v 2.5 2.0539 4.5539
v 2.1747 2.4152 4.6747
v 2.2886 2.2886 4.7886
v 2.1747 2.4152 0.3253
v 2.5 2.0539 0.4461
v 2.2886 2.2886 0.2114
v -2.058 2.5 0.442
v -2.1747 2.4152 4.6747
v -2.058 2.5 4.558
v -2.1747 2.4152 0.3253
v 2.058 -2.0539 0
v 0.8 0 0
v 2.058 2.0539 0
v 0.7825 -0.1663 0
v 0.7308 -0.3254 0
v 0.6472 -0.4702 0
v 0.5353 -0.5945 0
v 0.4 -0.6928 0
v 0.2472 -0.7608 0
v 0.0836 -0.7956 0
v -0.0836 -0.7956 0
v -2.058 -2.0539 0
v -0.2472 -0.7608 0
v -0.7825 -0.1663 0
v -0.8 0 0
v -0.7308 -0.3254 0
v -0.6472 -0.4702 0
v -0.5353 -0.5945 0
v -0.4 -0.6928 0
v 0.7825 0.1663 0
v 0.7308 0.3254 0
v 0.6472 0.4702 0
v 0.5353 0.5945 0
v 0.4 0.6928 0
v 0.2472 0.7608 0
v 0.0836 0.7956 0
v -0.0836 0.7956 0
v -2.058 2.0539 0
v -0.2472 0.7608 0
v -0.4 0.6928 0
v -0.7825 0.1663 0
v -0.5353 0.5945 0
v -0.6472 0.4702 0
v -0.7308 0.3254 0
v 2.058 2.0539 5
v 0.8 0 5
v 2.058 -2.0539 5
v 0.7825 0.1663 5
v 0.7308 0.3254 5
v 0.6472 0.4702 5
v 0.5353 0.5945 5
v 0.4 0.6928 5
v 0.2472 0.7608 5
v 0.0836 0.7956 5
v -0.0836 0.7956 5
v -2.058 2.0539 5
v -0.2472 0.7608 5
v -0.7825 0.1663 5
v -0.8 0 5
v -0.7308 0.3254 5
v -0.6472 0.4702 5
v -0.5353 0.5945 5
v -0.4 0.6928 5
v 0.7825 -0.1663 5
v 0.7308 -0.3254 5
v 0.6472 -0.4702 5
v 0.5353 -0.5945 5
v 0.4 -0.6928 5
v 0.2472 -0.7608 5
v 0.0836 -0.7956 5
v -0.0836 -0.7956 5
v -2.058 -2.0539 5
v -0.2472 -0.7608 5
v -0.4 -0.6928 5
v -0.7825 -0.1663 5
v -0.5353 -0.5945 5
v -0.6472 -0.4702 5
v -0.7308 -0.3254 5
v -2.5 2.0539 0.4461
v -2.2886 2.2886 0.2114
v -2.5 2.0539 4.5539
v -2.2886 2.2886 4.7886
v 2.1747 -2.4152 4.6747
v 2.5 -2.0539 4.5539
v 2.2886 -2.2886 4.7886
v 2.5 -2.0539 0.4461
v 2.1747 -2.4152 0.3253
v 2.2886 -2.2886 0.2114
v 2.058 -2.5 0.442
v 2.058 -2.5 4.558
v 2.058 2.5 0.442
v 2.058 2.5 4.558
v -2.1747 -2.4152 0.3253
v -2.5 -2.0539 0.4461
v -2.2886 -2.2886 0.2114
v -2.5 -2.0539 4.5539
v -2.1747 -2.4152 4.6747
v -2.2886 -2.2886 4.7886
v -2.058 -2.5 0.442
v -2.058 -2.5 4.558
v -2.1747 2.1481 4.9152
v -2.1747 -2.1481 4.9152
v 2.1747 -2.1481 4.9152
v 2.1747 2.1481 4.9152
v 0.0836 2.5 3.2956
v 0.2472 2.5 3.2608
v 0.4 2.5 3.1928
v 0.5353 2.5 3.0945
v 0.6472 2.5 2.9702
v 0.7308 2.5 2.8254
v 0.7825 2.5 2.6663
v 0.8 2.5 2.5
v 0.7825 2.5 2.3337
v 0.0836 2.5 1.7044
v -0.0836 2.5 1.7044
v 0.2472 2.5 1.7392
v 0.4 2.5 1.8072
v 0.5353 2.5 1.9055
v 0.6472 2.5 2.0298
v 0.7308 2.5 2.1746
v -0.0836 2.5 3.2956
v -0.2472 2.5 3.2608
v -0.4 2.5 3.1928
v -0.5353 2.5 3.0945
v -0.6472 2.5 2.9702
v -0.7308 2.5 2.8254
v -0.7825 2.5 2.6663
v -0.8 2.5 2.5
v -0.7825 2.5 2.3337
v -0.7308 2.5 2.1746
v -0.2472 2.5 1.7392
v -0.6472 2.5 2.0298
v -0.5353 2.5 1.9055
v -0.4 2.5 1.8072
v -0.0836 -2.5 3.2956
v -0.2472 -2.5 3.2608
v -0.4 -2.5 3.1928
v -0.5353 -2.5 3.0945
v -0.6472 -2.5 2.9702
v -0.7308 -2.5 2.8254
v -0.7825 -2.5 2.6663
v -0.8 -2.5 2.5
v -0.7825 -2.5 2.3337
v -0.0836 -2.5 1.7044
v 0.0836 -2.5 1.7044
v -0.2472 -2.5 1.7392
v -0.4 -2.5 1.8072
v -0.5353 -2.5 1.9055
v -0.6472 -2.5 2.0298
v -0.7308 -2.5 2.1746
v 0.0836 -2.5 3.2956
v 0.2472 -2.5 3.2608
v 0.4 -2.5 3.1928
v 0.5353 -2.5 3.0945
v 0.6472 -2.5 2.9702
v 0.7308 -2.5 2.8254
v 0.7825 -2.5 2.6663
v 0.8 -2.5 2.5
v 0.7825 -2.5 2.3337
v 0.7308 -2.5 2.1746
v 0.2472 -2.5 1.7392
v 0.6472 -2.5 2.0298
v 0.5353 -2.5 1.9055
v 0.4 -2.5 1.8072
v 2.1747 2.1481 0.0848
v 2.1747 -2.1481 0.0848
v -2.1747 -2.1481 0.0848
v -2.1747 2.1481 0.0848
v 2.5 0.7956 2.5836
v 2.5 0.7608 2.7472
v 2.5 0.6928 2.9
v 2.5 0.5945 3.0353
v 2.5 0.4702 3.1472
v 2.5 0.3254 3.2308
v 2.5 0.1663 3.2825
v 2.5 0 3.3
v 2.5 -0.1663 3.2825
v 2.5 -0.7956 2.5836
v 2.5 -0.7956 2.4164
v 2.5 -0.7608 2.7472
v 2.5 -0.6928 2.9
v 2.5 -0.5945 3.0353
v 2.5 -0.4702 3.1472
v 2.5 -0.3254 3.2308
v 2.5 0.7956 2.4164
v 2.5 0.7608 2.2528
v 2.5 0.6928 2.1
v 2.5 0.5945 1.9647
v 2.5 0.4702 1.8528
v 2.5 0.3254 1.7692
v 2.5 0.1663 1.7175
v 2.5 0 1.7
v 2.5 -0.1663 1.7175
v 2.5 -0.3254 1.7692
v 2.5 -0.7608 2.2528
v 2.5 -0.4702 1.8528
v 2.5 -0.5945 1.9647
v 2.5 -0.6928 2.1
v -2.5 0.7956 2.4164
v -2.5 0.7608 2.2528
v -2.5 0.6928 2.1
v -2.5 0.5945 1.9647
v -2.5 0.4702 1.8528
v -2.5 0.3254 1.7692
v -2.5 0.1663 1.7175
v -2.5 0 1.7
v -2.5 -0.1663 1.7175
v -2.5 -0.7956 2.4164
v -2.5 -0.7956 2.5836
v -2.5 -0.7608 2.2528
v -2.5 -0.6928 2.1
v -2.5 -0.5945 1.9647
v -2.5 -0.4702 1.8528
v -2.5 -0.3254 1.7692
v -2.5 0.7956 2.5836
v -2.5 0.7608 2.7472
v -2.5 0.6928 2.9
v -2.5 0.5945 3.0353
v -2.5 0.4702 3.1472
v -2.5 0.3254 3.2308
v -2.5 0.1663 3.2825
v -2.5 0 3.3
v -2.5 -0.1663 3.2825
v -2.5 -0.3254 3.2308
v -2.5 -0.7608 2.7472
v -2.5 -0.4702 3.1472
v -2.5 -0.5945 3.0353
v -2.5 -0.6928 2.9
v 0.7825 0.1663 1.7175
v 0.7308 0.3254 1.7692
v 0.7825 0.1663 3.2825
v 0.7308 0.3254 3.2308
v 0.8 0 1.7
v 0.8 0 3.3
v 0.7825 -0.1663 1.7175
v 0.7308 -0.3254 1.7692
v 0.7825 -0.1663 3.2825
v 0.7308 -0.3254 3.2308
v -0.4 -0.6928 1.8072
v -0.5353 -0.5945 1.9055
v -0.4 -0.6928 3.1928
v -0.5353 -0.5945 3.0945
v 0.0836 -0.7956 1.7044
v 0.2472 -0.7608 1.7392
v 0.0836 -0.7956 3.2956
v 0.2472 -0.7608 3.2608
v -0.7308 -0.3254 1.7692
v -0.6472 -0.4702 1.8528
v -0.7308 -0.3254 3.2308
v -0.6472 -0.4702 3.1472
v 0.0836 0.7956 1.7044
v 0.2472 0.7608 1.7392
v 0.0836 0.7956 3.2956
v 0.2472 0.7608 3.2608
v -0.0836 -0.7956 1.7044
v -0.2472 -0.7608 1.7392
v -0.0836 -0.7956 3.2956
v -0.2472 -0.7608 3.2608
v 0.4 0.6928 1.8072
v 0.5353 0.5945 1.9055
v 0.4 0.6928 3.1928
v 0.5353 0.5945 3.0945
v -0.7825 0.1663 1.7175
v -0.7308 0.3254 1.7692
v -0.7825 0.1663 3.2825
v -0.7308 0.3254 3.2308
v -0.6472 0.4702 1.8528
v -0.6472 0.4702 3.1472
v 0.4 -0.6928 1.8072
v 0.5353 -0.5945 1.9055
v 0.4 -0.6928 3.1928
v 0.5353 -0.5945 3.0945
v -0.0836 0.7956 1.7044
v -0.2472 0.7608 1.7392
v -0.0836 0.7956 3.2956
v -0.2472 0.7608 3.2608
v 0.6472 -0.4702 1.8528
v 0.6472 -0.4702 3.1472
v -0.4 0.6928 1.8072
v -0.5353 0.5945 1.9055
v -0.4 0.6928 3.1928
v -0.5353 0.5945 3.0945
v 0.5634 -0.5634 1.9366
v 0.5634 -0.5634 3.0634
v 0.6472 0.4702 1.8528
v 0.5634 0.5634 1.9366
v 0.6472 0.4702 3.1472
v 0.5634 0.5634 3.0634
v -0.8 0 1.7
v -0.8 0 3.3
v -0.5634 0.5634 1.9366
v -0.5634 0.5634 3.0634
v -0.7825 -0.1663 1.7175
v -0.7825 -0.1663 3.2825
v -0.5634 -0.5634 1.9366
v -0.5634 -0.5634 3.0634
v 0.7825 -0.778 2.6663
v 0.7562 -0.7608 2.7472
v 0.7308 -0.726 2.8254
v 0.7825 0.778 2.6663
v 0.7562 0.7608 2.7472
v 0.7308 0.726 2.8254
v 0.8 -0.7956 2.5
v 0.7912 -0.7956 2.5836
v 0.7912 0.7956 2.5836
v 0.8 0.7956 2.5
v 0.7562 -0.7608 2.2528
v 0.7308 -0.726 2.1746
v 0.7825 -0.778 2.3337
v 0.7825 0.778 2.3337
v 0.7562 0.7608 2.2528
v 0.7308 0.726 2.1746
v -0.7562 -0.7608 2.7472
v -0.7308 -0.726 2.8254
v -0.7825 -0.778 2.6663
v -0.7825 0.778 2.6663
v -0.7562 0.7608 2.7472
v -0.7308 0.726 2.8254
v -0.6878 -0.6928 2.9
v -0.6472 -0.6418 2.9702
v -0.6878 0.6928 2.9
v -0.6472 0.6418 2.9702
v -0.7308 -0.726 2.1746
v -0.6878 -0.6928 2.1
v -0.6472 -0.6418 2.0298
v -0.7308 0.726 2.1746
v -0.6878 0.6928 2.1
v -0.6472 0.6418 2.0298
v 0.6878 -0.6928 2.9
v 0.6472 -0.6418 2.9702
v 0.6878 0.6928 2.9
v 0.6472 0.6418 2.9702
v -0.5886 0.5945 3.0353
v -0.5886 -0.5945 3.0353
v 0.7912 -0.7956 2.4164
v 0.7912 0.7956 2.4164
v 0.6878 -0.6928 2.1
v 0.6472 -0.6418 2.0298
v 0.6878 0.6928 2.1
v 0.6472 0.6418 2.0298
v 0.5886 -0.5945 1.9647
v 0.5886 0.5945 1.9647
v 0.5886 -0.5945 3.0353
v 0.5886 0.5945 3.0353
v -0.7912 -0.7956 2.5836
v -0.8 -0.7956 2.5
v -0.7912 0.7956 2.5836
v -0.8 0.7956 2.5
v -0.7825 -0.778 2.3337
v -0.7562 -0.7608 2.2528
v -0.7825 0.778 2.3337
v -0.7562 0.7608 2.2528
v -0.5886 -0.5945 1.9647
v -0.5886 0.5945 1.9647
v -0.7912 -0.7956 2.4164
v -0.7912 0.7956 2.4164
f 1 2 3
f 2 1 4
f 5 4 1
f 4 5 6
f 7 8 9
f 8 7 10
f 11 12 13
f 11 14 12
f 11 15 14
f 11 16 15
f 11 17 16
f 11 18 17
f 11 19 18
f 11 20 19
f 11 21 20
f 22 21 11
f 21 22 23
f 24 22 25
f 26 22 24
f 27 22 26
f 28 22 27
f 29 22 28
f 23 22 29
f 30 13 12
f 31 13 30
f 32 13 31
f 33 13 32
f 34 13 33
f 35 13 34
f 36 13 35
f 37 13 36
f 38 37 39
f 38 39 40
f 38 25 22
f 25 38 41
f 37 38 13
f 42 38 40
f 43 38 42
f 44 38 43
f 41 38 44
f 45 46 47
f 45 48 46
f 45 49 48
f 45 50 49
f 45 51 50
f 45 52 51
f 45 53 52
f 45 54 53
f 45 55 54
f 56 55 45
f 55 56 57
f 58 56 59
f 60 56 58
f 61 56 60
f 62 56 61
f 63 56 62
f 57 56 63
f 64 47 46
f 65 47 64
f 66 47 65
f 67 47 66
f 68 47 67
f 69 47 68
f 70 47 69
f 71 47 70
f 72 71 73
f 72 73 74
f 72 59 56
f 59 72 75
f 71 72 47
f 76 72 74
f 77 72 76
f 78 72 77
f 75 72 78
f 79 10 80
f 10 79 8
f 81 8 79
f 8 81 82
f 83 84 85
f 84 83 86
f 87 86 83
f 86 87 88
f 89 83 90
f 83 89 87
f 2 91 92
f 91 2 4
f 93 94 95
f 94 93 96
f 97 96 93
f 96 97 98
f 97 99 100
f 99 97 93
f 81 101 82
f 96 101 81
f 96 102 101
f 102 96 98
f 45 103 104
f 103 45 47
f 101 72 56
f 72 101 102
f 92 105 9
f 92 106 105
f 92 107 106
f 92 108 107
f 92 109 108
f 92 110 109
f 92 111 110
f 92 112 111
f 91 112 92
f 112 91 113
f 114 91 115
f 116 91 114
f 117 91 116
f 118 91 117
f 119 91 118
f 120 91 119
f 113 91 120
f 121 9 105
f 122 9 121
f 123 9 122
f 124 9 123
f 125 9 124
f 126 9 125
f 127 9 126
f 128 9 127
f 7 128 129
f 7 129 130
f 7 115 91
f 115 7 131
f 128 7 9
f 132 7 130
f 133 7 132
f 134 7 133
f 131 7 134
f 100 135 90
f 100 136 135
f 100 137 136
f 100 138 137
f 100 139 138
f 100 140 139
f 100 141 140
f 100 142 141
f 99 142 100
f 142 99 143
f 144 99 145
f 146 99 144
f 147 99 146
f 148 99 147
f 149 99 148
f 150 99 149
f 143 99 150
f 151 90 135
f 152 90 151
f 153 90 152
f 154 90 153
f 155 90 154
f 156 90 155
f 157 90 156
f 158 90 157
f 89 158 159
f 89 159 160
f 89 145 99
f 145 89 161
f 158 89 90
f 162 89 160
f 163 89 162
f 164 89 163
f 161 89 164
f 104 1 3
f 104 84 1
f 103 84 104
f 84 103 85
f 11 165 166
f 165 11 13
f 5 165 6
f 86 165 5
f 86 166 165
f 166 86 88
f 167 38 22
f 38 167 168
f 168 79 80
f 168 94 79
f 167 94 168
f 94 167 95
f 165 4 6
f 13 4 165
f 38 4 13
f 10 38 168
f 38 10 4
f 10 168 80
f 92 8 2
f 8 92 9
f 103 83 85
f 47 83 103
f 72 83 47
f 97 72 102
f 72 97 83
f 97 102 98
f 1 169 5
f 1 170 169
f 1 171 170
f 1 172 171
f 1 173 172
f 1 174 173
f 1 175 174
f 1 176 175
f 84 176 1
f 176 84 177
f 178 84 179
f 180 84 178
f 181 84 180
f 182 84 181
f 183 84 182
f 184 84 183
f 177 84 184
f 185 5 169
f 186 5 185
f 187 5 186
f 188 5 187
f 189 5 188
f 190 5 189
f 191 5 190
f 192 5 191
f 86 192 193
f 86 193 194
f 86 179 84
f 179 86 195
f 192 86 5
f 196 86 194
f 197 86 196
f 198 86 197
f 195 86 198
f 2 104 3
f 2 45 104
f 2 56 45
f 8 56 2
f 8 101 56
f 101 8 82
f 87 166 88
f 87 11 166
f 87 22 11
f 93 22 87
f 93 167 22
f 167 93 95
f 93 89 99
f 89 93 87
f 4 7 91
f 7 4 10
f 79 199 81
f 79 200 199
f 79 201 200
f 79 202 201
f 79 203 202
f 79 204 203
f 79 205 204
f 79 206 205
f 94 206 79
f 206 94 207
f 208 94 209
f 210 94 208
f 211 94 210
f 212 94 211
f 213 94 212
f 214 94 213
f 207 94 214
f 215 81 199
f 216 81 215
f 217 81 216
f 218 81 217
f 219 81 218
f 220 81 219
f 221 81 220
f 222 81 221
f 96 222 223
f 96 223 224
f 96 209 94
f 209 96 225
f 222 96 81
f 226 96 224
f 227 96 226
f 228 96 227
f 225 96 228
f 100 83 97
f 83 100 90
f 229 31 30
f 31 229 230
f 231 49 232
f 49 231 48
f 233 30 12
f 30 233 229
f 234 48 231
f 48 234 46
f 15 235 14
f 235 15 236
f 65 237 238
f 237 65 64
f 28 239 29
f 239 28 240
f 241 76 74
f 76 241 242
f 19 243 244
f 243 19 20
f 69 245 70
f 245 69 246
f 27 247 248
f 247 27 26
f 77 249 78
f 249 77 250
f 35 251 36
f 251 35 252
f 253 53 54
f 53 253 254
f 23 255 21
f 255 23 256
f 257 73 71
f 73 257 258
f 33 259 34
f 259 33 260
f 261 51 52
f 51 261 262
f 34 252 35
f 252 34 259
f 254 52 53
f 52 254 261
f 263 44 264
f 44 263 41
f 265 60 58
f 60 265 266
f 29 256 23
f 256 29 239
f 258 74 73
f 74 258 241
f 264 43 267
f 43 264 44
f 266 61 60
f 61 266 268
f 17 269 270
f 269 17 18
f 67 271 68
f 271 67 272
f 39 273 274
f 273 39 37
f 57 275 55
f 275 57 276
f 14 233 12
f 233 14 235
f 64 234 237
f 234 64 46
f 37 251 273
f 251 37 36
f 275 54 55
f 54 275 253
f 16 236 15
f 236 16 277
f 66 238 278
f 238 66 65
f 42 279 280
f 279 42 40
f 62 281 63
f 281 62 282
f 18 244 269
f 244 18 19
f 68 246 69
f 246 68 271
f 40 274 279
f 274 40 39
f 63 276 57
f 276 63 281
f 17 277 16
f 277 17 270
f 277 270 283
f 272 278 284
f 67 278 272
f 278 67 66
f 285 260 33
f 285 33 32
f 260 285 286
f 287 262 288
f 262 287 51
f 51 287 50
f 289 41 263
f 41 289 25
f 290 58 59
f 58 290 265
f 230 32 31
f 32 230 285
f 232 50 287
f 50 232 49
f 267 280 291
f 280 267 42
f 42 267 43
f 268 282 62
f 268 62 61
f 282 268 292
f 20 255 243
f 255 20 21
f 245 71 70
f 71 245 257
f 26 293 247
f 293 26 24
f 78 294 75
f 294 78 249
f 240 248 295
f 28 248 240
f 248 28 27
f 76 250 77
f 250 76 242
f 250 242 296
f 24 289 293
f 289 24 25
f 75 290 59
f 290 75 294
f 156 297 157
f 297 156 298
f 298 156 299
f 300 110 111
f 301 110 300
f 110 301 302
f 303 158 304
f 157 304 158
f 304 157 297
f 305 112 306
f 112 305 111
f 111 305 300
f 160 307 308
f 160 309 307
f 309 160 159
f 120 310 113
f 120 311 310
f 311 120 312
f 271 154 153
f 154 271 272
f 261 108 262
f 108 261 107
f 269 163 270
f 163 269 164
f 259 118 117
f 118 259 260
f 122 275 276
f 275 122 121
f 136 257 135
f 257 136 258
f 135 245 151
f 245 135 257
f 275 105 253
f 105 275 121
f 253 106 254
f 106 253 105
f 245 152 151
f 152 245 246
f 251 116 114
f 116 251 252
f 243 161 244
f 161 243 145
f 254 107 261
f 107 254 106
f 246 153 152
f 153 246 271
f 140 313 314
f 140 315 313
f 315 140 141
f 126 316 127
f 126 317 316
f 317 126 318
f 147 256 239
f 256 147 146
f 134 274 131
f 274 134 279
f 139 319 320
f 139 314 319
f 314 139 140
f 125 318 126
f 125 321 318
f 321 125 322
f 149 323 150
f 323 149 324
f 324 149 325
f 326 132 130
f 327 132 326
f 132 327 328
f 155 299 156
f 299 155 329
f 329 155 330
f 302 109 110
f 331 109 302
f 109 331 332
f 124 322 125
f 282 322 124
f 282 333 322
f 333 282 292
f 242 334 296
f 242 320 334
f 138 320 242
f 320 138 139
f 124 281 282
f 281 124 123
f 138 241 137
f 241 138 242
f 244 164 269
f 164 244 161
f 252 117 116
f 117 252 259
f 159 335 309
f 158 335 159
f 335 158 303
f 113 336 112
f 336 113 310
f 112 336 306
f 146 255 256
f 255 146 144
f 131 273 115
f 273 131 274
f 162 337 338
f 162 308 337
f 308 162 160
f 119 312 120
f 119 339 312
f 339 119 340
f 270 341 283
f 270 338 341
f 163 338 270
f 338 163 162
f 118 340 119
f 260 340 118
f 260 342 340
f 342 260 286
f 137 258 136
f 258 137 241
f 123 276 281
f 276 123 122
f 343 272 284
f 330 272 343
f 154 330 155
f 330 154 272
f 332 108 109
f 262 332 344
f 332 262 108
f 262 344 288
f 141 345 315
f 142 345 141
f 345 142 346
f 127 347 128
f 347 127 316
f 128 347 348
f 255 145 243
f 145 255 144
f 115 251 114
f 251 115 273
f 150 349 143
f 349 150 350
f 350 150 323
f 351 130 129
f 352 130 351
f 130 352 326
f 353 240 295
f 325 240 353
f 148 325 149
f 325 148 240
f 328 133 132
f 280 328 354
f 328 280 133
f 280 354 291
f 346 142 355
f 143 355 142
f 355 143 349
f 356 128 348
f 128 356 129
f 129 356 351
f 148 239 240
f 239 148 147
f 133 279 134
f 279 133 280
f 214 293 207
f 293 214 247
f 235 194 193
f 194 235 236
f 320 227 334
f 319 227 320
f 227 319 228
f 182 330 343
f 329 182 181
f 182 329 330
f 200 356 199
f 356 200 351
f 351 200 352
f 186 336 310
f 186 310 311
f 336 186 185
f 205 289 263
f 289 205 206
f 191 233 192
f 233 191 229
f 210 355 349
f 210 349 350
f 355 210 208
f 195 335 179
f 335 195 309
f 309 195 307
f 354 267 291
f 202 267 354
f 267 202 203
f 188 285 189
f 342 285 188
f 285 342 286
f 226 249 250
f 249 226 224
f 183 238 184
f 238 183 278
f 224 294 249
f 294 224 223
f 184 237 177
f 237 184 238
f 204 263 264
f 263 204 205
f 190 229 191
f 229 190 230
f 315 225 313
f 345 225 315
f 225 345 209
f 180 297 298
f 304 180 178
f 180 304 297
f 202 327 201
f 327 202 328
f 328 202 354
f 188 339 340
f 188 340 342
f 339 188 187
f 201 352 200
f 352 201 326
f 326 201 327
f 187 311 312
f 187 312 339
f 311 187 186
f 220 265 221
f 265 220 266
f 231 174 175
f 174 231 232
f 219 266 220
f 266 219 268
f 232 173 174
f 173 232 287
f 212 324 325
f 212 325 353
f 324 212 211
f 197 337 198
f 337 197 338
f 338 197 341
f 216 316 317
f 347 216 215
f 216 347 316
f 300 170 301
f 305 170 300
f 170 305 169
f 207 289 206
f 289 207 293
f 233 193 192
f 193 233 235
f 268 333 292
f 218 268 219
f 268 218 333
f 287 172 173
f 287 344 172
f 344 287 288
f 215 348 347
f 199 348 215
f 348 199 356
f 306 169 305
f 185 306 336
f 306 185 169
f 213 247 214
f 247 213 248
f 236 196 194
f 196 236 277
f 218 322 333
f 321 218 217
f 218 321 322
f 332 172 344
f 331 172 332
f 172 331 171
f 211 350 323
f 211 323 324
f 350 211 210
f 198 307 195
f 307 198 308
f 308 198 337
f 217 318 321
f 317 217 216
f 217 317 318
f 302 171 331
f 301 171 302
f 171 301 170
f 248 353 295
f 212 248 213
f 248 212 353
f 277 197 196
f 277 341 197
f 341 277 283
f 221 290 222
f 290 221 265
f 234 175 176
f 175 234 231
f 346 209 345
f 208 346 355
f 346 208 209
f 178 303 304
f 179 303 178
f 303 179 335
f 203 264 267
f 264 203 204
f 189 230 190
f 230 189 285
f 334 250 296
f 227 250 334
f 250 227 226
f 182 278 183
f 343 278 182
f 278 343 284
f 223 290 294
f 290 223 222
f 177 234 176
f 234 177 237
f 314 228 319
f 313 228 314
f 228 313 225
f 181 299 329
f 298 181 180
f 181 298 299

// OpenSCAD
$fn =30;
module peghole(){
    color("Blue")cylinder (6, .8, .8, true);
}
// the peg hole template, a change in size here changes hole everywhere


module edge(){
cylinder (5, 3.25, 3.25, true);
}
// a cylinder for making block


module block(){
    intersection(){
edge();
rotate([90,0,0]) edge();
rotate([0, 90, 0]) edge();
}
}
// create the base cube without the holes


module blox(){
difference(){ 
block();
   peghole();
rotate ([90, 0, 0]) peghole();
rotate ([0, 90, 0]) peghole();
}
}
//unembeleshed blox cube

module cross(){
blox();
translate([5,0,0]) blox();
translate([-5,0,0]) blox();
translate([0,0,5]) blox();
translate([0,0,-5]) blox();
}
// central blox cross

module corner(){difference(){
    block();
   translate([-3,-3,3])rotate([0,45,0])
cube([8,6
   ,4]) color("Red");
 rotate([0,90,0])
   translate([0,0,-4]) peghole();
 translate([0,0,-4]) peghole();   
 rotate([0,45,0]) translate([0,0,1])peghole();   
}
}
    
//anled blox piece

module side(){
    blox();
    translate([0,0,5])corner();
translate([0,0,-5]) rotate([0,90,0]) corner();
}
// Pentagram side of octagon, can be own piece

module 3long() {
    blox();
    translate([0,0,5]) blox();
    translate([0,0,-5]) blox();
}

module opcorner(){
    translate([5,0,5]) corner();
translate([-5,0,-5]) rotate([0,180,0])corner();
}
// unused now


module oct() {
3long();
translate([5,0,0]) side();
translate([-5,0,0]) rotate([0,180,0]) side();
}
// one octagon of blox, can be used as own piece

module longside() {
side();
translate([0,5,0]) side();
translate([0,-5,0]) side();
}
// long side can be used as own piece

module hexlong(){
longside();
translate([-5,0,0]) rotate([0,180,0]) longside();
}
// long side in the combined form, usable as piece


module 3X3() {
3long();
translate([0,5,0]) 3long();
translate([0,-5,0]) 3long();
}
// plate of 3X3 blox can be used as own piece


module long(){
    oct();
translate([0,5,0]) oct();
translate([0,-5,0]) oct();
}
// octoganal tube with solid fill

module longhollow(){
difference(){
long();
cube([10,10,5], true);
cube([5,10,10], true);
}
}
// lighter octoganal tube

module test(){
translate([0,0,10]) blox();
rotate([0,45,0]) translate([0,0,9.5]) blox();
}
// set up angle for bracket design
translate([0,0,2.5]) blox();

module flatcap() {
    CapPoints = [ [0,7.5,0],[5,2.5,0],[5,-2.5,0],[0,-7.5,0],[0,2.5,5],[2.5,2.5,5],[2.5,-2.5,5],[0,-2.5,5] ];
CapFaces = [ [0,1,2,3],[1,0,5],[3,2,6],[3,6,7],[3,7,4,0],[2,1,5,6],[5,4,7,6],[4,5,0] ];
polyhedron(CapPoints, CapFaces,convexity = 1);
}


module bracketbase(){
    difference(){
rotate([0,30,0])translate([1,0,-1]) cube([5,3,5], true);
translate([-2.5,0,-10]) test();
 translate([-4,-3,-3])cube([3,5,5]);translate([-.5,0,-4.5])rotate([0,30,0]) cube(4.1, true);translate([-4,-2,-5])cube(4);    
  }
}
